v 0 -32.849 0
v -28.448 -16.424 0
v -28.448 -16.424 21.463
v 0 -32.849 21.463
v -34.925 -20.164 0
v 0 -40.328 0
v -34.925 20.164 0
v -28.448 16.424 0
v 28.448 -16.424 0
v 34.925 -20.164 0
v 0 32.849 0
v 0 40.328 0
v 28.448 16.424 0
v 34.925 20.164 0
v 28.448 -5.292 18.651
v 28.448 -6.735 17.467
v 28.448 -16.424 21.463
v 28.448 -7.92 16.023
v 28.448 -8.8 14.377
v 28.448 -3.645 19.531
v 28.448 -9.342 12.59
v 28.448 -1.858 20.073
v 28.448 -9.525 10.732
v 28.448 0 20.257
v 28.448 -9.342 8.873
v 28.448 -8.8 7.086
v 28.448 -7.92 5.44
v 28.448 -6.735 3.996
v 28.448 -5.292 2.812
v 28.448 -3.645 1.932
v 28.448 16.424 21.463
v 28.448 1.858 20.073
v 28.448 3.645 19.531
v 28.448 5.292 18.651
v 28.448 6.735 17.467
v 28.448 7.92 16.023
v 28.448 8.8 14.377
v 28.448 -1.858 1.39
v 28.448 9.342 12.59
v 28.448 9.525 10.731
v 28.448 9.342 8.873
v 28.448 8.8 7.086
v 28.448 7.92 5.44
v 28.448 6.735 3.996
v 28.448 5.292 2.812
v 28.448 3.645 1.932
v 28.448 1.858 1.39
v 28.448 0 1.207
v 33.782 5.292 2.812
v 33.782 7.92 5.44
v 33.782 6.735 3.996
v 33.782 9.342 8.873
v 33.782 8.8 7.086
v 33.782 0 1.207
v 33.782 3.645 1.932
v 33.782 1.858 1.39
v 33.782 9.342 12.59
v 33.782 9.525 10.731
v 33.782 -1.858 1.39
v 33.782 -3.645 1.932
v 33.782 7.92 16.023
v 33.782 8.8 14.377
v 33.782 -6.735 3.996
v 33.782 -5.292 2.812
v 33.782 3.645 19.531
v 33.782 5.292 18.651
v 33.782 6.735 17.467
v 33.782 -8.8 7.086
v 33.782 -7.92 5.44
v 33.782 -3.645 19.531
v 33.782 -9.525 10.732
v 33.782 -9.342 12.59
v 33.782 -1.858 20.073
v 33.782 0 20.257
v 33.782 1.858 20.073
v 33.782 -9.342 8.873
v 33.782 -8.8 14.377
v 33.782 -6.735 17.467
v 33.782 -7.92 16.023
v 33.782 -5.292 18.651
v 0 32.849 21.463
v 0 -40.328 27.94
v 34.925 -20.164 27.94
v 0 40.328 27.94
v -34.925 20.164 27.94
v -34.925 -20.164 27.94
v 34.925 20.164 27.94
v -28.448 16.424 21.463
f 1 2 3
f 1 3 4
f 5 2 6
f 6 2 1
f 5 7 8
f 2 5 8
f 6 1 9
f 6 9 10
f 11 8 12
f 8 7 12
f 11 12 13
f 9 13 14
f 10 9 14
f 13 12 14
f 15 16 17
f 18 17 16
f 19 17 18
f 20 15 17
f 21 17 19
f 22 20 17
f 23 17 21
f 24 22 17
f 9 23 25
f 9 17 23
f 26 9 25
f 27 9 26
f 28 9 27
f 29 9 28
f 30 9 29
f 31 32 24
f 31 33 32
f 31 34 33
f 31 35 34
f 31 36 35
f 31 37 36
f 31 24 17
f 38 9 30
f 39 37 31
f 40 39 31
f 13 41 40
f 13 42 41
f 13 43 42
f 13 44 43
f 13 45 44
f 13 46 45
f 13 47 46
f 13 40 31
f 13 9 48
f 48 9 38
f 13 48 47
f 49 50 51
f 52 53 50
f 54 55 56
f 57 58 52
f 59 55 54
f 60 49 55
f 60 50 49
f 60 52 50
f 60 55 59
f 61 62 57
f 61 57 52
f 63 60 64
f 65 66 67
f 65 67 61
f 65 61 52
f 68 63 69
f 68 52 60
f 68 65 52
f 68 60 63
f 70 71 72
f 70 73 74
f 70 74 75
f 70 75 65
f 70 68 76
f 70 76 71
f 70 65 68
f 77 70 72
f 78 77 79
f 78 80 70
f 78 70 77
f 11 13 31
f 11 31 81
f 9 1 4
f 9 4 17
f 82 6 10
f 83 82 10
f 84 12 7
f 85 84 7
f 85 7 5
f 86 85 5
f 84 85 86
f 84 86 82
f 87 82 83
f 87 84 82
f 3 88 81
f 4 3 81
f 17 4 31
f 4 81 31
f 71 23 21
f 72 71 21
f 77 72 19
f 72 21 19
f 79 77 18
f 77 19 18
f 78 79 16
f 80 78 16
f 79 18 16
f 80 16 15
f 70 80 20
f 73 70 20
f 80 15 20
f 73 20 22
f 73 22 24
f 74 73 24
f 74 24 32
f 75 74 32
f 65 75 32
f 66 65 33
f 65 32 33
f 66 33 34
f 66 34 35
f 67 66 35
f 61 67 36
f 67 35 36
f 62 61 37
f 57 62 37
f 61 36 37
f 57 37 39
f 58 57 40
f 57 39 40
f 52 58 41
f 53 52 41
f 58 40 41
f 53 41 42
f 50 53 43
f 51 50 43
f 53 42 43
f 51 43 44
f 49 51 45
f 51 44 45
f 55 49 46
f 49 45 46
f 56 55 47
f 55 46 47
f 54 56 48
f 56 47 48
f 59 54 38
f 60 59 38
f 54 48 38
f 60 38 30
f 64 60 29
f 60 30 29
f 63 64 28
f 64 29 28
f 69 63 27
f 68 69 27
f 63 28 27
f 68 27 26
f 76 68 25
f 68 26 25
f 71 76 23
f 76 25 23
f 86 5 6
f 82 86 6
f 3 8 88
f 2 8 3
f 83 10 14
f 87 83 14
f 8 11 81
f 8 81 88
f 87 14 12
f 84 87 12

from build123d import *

# Parameters (mm, degrees)
F1_DEPTH = 27.94
F2_T     = -6.477
F3_R     = 9.525
F4_DEPTH = 5.334


with BuildPart() as f1:
    # F0 (on Top) → F1 (new body)
    with BuildSketch(Plane.XY):
        Polygon((34.925, 20.163958), (0, 40.327916), (-34.925, 20.163958), (-34.925, -20.163958), (0, -40.327916), (34.925, -20.163958), align=None)
    extrude(amount=F1_DEPTH)

    # F2
    f2_openings = [f1.faces().sort_by_distance(p)[0] for p in [
        (0, 0, 0),
    ]]
    offset(amount=F2_T, openings=f2_openings)

    # F3 (on face) → F4 (cut)
    with BuildSketch(Plane(origin=(28.448, 0, 0), x_dir=(0, -1, 0), z_dir=(-1, 0, 0))):
        with Locations((0, 10.7315)):
            Circle(F3_R)
    extrude(amount=-F4_DEPTH, mode=Mode.SUBTRACT)


solid = f1.part
